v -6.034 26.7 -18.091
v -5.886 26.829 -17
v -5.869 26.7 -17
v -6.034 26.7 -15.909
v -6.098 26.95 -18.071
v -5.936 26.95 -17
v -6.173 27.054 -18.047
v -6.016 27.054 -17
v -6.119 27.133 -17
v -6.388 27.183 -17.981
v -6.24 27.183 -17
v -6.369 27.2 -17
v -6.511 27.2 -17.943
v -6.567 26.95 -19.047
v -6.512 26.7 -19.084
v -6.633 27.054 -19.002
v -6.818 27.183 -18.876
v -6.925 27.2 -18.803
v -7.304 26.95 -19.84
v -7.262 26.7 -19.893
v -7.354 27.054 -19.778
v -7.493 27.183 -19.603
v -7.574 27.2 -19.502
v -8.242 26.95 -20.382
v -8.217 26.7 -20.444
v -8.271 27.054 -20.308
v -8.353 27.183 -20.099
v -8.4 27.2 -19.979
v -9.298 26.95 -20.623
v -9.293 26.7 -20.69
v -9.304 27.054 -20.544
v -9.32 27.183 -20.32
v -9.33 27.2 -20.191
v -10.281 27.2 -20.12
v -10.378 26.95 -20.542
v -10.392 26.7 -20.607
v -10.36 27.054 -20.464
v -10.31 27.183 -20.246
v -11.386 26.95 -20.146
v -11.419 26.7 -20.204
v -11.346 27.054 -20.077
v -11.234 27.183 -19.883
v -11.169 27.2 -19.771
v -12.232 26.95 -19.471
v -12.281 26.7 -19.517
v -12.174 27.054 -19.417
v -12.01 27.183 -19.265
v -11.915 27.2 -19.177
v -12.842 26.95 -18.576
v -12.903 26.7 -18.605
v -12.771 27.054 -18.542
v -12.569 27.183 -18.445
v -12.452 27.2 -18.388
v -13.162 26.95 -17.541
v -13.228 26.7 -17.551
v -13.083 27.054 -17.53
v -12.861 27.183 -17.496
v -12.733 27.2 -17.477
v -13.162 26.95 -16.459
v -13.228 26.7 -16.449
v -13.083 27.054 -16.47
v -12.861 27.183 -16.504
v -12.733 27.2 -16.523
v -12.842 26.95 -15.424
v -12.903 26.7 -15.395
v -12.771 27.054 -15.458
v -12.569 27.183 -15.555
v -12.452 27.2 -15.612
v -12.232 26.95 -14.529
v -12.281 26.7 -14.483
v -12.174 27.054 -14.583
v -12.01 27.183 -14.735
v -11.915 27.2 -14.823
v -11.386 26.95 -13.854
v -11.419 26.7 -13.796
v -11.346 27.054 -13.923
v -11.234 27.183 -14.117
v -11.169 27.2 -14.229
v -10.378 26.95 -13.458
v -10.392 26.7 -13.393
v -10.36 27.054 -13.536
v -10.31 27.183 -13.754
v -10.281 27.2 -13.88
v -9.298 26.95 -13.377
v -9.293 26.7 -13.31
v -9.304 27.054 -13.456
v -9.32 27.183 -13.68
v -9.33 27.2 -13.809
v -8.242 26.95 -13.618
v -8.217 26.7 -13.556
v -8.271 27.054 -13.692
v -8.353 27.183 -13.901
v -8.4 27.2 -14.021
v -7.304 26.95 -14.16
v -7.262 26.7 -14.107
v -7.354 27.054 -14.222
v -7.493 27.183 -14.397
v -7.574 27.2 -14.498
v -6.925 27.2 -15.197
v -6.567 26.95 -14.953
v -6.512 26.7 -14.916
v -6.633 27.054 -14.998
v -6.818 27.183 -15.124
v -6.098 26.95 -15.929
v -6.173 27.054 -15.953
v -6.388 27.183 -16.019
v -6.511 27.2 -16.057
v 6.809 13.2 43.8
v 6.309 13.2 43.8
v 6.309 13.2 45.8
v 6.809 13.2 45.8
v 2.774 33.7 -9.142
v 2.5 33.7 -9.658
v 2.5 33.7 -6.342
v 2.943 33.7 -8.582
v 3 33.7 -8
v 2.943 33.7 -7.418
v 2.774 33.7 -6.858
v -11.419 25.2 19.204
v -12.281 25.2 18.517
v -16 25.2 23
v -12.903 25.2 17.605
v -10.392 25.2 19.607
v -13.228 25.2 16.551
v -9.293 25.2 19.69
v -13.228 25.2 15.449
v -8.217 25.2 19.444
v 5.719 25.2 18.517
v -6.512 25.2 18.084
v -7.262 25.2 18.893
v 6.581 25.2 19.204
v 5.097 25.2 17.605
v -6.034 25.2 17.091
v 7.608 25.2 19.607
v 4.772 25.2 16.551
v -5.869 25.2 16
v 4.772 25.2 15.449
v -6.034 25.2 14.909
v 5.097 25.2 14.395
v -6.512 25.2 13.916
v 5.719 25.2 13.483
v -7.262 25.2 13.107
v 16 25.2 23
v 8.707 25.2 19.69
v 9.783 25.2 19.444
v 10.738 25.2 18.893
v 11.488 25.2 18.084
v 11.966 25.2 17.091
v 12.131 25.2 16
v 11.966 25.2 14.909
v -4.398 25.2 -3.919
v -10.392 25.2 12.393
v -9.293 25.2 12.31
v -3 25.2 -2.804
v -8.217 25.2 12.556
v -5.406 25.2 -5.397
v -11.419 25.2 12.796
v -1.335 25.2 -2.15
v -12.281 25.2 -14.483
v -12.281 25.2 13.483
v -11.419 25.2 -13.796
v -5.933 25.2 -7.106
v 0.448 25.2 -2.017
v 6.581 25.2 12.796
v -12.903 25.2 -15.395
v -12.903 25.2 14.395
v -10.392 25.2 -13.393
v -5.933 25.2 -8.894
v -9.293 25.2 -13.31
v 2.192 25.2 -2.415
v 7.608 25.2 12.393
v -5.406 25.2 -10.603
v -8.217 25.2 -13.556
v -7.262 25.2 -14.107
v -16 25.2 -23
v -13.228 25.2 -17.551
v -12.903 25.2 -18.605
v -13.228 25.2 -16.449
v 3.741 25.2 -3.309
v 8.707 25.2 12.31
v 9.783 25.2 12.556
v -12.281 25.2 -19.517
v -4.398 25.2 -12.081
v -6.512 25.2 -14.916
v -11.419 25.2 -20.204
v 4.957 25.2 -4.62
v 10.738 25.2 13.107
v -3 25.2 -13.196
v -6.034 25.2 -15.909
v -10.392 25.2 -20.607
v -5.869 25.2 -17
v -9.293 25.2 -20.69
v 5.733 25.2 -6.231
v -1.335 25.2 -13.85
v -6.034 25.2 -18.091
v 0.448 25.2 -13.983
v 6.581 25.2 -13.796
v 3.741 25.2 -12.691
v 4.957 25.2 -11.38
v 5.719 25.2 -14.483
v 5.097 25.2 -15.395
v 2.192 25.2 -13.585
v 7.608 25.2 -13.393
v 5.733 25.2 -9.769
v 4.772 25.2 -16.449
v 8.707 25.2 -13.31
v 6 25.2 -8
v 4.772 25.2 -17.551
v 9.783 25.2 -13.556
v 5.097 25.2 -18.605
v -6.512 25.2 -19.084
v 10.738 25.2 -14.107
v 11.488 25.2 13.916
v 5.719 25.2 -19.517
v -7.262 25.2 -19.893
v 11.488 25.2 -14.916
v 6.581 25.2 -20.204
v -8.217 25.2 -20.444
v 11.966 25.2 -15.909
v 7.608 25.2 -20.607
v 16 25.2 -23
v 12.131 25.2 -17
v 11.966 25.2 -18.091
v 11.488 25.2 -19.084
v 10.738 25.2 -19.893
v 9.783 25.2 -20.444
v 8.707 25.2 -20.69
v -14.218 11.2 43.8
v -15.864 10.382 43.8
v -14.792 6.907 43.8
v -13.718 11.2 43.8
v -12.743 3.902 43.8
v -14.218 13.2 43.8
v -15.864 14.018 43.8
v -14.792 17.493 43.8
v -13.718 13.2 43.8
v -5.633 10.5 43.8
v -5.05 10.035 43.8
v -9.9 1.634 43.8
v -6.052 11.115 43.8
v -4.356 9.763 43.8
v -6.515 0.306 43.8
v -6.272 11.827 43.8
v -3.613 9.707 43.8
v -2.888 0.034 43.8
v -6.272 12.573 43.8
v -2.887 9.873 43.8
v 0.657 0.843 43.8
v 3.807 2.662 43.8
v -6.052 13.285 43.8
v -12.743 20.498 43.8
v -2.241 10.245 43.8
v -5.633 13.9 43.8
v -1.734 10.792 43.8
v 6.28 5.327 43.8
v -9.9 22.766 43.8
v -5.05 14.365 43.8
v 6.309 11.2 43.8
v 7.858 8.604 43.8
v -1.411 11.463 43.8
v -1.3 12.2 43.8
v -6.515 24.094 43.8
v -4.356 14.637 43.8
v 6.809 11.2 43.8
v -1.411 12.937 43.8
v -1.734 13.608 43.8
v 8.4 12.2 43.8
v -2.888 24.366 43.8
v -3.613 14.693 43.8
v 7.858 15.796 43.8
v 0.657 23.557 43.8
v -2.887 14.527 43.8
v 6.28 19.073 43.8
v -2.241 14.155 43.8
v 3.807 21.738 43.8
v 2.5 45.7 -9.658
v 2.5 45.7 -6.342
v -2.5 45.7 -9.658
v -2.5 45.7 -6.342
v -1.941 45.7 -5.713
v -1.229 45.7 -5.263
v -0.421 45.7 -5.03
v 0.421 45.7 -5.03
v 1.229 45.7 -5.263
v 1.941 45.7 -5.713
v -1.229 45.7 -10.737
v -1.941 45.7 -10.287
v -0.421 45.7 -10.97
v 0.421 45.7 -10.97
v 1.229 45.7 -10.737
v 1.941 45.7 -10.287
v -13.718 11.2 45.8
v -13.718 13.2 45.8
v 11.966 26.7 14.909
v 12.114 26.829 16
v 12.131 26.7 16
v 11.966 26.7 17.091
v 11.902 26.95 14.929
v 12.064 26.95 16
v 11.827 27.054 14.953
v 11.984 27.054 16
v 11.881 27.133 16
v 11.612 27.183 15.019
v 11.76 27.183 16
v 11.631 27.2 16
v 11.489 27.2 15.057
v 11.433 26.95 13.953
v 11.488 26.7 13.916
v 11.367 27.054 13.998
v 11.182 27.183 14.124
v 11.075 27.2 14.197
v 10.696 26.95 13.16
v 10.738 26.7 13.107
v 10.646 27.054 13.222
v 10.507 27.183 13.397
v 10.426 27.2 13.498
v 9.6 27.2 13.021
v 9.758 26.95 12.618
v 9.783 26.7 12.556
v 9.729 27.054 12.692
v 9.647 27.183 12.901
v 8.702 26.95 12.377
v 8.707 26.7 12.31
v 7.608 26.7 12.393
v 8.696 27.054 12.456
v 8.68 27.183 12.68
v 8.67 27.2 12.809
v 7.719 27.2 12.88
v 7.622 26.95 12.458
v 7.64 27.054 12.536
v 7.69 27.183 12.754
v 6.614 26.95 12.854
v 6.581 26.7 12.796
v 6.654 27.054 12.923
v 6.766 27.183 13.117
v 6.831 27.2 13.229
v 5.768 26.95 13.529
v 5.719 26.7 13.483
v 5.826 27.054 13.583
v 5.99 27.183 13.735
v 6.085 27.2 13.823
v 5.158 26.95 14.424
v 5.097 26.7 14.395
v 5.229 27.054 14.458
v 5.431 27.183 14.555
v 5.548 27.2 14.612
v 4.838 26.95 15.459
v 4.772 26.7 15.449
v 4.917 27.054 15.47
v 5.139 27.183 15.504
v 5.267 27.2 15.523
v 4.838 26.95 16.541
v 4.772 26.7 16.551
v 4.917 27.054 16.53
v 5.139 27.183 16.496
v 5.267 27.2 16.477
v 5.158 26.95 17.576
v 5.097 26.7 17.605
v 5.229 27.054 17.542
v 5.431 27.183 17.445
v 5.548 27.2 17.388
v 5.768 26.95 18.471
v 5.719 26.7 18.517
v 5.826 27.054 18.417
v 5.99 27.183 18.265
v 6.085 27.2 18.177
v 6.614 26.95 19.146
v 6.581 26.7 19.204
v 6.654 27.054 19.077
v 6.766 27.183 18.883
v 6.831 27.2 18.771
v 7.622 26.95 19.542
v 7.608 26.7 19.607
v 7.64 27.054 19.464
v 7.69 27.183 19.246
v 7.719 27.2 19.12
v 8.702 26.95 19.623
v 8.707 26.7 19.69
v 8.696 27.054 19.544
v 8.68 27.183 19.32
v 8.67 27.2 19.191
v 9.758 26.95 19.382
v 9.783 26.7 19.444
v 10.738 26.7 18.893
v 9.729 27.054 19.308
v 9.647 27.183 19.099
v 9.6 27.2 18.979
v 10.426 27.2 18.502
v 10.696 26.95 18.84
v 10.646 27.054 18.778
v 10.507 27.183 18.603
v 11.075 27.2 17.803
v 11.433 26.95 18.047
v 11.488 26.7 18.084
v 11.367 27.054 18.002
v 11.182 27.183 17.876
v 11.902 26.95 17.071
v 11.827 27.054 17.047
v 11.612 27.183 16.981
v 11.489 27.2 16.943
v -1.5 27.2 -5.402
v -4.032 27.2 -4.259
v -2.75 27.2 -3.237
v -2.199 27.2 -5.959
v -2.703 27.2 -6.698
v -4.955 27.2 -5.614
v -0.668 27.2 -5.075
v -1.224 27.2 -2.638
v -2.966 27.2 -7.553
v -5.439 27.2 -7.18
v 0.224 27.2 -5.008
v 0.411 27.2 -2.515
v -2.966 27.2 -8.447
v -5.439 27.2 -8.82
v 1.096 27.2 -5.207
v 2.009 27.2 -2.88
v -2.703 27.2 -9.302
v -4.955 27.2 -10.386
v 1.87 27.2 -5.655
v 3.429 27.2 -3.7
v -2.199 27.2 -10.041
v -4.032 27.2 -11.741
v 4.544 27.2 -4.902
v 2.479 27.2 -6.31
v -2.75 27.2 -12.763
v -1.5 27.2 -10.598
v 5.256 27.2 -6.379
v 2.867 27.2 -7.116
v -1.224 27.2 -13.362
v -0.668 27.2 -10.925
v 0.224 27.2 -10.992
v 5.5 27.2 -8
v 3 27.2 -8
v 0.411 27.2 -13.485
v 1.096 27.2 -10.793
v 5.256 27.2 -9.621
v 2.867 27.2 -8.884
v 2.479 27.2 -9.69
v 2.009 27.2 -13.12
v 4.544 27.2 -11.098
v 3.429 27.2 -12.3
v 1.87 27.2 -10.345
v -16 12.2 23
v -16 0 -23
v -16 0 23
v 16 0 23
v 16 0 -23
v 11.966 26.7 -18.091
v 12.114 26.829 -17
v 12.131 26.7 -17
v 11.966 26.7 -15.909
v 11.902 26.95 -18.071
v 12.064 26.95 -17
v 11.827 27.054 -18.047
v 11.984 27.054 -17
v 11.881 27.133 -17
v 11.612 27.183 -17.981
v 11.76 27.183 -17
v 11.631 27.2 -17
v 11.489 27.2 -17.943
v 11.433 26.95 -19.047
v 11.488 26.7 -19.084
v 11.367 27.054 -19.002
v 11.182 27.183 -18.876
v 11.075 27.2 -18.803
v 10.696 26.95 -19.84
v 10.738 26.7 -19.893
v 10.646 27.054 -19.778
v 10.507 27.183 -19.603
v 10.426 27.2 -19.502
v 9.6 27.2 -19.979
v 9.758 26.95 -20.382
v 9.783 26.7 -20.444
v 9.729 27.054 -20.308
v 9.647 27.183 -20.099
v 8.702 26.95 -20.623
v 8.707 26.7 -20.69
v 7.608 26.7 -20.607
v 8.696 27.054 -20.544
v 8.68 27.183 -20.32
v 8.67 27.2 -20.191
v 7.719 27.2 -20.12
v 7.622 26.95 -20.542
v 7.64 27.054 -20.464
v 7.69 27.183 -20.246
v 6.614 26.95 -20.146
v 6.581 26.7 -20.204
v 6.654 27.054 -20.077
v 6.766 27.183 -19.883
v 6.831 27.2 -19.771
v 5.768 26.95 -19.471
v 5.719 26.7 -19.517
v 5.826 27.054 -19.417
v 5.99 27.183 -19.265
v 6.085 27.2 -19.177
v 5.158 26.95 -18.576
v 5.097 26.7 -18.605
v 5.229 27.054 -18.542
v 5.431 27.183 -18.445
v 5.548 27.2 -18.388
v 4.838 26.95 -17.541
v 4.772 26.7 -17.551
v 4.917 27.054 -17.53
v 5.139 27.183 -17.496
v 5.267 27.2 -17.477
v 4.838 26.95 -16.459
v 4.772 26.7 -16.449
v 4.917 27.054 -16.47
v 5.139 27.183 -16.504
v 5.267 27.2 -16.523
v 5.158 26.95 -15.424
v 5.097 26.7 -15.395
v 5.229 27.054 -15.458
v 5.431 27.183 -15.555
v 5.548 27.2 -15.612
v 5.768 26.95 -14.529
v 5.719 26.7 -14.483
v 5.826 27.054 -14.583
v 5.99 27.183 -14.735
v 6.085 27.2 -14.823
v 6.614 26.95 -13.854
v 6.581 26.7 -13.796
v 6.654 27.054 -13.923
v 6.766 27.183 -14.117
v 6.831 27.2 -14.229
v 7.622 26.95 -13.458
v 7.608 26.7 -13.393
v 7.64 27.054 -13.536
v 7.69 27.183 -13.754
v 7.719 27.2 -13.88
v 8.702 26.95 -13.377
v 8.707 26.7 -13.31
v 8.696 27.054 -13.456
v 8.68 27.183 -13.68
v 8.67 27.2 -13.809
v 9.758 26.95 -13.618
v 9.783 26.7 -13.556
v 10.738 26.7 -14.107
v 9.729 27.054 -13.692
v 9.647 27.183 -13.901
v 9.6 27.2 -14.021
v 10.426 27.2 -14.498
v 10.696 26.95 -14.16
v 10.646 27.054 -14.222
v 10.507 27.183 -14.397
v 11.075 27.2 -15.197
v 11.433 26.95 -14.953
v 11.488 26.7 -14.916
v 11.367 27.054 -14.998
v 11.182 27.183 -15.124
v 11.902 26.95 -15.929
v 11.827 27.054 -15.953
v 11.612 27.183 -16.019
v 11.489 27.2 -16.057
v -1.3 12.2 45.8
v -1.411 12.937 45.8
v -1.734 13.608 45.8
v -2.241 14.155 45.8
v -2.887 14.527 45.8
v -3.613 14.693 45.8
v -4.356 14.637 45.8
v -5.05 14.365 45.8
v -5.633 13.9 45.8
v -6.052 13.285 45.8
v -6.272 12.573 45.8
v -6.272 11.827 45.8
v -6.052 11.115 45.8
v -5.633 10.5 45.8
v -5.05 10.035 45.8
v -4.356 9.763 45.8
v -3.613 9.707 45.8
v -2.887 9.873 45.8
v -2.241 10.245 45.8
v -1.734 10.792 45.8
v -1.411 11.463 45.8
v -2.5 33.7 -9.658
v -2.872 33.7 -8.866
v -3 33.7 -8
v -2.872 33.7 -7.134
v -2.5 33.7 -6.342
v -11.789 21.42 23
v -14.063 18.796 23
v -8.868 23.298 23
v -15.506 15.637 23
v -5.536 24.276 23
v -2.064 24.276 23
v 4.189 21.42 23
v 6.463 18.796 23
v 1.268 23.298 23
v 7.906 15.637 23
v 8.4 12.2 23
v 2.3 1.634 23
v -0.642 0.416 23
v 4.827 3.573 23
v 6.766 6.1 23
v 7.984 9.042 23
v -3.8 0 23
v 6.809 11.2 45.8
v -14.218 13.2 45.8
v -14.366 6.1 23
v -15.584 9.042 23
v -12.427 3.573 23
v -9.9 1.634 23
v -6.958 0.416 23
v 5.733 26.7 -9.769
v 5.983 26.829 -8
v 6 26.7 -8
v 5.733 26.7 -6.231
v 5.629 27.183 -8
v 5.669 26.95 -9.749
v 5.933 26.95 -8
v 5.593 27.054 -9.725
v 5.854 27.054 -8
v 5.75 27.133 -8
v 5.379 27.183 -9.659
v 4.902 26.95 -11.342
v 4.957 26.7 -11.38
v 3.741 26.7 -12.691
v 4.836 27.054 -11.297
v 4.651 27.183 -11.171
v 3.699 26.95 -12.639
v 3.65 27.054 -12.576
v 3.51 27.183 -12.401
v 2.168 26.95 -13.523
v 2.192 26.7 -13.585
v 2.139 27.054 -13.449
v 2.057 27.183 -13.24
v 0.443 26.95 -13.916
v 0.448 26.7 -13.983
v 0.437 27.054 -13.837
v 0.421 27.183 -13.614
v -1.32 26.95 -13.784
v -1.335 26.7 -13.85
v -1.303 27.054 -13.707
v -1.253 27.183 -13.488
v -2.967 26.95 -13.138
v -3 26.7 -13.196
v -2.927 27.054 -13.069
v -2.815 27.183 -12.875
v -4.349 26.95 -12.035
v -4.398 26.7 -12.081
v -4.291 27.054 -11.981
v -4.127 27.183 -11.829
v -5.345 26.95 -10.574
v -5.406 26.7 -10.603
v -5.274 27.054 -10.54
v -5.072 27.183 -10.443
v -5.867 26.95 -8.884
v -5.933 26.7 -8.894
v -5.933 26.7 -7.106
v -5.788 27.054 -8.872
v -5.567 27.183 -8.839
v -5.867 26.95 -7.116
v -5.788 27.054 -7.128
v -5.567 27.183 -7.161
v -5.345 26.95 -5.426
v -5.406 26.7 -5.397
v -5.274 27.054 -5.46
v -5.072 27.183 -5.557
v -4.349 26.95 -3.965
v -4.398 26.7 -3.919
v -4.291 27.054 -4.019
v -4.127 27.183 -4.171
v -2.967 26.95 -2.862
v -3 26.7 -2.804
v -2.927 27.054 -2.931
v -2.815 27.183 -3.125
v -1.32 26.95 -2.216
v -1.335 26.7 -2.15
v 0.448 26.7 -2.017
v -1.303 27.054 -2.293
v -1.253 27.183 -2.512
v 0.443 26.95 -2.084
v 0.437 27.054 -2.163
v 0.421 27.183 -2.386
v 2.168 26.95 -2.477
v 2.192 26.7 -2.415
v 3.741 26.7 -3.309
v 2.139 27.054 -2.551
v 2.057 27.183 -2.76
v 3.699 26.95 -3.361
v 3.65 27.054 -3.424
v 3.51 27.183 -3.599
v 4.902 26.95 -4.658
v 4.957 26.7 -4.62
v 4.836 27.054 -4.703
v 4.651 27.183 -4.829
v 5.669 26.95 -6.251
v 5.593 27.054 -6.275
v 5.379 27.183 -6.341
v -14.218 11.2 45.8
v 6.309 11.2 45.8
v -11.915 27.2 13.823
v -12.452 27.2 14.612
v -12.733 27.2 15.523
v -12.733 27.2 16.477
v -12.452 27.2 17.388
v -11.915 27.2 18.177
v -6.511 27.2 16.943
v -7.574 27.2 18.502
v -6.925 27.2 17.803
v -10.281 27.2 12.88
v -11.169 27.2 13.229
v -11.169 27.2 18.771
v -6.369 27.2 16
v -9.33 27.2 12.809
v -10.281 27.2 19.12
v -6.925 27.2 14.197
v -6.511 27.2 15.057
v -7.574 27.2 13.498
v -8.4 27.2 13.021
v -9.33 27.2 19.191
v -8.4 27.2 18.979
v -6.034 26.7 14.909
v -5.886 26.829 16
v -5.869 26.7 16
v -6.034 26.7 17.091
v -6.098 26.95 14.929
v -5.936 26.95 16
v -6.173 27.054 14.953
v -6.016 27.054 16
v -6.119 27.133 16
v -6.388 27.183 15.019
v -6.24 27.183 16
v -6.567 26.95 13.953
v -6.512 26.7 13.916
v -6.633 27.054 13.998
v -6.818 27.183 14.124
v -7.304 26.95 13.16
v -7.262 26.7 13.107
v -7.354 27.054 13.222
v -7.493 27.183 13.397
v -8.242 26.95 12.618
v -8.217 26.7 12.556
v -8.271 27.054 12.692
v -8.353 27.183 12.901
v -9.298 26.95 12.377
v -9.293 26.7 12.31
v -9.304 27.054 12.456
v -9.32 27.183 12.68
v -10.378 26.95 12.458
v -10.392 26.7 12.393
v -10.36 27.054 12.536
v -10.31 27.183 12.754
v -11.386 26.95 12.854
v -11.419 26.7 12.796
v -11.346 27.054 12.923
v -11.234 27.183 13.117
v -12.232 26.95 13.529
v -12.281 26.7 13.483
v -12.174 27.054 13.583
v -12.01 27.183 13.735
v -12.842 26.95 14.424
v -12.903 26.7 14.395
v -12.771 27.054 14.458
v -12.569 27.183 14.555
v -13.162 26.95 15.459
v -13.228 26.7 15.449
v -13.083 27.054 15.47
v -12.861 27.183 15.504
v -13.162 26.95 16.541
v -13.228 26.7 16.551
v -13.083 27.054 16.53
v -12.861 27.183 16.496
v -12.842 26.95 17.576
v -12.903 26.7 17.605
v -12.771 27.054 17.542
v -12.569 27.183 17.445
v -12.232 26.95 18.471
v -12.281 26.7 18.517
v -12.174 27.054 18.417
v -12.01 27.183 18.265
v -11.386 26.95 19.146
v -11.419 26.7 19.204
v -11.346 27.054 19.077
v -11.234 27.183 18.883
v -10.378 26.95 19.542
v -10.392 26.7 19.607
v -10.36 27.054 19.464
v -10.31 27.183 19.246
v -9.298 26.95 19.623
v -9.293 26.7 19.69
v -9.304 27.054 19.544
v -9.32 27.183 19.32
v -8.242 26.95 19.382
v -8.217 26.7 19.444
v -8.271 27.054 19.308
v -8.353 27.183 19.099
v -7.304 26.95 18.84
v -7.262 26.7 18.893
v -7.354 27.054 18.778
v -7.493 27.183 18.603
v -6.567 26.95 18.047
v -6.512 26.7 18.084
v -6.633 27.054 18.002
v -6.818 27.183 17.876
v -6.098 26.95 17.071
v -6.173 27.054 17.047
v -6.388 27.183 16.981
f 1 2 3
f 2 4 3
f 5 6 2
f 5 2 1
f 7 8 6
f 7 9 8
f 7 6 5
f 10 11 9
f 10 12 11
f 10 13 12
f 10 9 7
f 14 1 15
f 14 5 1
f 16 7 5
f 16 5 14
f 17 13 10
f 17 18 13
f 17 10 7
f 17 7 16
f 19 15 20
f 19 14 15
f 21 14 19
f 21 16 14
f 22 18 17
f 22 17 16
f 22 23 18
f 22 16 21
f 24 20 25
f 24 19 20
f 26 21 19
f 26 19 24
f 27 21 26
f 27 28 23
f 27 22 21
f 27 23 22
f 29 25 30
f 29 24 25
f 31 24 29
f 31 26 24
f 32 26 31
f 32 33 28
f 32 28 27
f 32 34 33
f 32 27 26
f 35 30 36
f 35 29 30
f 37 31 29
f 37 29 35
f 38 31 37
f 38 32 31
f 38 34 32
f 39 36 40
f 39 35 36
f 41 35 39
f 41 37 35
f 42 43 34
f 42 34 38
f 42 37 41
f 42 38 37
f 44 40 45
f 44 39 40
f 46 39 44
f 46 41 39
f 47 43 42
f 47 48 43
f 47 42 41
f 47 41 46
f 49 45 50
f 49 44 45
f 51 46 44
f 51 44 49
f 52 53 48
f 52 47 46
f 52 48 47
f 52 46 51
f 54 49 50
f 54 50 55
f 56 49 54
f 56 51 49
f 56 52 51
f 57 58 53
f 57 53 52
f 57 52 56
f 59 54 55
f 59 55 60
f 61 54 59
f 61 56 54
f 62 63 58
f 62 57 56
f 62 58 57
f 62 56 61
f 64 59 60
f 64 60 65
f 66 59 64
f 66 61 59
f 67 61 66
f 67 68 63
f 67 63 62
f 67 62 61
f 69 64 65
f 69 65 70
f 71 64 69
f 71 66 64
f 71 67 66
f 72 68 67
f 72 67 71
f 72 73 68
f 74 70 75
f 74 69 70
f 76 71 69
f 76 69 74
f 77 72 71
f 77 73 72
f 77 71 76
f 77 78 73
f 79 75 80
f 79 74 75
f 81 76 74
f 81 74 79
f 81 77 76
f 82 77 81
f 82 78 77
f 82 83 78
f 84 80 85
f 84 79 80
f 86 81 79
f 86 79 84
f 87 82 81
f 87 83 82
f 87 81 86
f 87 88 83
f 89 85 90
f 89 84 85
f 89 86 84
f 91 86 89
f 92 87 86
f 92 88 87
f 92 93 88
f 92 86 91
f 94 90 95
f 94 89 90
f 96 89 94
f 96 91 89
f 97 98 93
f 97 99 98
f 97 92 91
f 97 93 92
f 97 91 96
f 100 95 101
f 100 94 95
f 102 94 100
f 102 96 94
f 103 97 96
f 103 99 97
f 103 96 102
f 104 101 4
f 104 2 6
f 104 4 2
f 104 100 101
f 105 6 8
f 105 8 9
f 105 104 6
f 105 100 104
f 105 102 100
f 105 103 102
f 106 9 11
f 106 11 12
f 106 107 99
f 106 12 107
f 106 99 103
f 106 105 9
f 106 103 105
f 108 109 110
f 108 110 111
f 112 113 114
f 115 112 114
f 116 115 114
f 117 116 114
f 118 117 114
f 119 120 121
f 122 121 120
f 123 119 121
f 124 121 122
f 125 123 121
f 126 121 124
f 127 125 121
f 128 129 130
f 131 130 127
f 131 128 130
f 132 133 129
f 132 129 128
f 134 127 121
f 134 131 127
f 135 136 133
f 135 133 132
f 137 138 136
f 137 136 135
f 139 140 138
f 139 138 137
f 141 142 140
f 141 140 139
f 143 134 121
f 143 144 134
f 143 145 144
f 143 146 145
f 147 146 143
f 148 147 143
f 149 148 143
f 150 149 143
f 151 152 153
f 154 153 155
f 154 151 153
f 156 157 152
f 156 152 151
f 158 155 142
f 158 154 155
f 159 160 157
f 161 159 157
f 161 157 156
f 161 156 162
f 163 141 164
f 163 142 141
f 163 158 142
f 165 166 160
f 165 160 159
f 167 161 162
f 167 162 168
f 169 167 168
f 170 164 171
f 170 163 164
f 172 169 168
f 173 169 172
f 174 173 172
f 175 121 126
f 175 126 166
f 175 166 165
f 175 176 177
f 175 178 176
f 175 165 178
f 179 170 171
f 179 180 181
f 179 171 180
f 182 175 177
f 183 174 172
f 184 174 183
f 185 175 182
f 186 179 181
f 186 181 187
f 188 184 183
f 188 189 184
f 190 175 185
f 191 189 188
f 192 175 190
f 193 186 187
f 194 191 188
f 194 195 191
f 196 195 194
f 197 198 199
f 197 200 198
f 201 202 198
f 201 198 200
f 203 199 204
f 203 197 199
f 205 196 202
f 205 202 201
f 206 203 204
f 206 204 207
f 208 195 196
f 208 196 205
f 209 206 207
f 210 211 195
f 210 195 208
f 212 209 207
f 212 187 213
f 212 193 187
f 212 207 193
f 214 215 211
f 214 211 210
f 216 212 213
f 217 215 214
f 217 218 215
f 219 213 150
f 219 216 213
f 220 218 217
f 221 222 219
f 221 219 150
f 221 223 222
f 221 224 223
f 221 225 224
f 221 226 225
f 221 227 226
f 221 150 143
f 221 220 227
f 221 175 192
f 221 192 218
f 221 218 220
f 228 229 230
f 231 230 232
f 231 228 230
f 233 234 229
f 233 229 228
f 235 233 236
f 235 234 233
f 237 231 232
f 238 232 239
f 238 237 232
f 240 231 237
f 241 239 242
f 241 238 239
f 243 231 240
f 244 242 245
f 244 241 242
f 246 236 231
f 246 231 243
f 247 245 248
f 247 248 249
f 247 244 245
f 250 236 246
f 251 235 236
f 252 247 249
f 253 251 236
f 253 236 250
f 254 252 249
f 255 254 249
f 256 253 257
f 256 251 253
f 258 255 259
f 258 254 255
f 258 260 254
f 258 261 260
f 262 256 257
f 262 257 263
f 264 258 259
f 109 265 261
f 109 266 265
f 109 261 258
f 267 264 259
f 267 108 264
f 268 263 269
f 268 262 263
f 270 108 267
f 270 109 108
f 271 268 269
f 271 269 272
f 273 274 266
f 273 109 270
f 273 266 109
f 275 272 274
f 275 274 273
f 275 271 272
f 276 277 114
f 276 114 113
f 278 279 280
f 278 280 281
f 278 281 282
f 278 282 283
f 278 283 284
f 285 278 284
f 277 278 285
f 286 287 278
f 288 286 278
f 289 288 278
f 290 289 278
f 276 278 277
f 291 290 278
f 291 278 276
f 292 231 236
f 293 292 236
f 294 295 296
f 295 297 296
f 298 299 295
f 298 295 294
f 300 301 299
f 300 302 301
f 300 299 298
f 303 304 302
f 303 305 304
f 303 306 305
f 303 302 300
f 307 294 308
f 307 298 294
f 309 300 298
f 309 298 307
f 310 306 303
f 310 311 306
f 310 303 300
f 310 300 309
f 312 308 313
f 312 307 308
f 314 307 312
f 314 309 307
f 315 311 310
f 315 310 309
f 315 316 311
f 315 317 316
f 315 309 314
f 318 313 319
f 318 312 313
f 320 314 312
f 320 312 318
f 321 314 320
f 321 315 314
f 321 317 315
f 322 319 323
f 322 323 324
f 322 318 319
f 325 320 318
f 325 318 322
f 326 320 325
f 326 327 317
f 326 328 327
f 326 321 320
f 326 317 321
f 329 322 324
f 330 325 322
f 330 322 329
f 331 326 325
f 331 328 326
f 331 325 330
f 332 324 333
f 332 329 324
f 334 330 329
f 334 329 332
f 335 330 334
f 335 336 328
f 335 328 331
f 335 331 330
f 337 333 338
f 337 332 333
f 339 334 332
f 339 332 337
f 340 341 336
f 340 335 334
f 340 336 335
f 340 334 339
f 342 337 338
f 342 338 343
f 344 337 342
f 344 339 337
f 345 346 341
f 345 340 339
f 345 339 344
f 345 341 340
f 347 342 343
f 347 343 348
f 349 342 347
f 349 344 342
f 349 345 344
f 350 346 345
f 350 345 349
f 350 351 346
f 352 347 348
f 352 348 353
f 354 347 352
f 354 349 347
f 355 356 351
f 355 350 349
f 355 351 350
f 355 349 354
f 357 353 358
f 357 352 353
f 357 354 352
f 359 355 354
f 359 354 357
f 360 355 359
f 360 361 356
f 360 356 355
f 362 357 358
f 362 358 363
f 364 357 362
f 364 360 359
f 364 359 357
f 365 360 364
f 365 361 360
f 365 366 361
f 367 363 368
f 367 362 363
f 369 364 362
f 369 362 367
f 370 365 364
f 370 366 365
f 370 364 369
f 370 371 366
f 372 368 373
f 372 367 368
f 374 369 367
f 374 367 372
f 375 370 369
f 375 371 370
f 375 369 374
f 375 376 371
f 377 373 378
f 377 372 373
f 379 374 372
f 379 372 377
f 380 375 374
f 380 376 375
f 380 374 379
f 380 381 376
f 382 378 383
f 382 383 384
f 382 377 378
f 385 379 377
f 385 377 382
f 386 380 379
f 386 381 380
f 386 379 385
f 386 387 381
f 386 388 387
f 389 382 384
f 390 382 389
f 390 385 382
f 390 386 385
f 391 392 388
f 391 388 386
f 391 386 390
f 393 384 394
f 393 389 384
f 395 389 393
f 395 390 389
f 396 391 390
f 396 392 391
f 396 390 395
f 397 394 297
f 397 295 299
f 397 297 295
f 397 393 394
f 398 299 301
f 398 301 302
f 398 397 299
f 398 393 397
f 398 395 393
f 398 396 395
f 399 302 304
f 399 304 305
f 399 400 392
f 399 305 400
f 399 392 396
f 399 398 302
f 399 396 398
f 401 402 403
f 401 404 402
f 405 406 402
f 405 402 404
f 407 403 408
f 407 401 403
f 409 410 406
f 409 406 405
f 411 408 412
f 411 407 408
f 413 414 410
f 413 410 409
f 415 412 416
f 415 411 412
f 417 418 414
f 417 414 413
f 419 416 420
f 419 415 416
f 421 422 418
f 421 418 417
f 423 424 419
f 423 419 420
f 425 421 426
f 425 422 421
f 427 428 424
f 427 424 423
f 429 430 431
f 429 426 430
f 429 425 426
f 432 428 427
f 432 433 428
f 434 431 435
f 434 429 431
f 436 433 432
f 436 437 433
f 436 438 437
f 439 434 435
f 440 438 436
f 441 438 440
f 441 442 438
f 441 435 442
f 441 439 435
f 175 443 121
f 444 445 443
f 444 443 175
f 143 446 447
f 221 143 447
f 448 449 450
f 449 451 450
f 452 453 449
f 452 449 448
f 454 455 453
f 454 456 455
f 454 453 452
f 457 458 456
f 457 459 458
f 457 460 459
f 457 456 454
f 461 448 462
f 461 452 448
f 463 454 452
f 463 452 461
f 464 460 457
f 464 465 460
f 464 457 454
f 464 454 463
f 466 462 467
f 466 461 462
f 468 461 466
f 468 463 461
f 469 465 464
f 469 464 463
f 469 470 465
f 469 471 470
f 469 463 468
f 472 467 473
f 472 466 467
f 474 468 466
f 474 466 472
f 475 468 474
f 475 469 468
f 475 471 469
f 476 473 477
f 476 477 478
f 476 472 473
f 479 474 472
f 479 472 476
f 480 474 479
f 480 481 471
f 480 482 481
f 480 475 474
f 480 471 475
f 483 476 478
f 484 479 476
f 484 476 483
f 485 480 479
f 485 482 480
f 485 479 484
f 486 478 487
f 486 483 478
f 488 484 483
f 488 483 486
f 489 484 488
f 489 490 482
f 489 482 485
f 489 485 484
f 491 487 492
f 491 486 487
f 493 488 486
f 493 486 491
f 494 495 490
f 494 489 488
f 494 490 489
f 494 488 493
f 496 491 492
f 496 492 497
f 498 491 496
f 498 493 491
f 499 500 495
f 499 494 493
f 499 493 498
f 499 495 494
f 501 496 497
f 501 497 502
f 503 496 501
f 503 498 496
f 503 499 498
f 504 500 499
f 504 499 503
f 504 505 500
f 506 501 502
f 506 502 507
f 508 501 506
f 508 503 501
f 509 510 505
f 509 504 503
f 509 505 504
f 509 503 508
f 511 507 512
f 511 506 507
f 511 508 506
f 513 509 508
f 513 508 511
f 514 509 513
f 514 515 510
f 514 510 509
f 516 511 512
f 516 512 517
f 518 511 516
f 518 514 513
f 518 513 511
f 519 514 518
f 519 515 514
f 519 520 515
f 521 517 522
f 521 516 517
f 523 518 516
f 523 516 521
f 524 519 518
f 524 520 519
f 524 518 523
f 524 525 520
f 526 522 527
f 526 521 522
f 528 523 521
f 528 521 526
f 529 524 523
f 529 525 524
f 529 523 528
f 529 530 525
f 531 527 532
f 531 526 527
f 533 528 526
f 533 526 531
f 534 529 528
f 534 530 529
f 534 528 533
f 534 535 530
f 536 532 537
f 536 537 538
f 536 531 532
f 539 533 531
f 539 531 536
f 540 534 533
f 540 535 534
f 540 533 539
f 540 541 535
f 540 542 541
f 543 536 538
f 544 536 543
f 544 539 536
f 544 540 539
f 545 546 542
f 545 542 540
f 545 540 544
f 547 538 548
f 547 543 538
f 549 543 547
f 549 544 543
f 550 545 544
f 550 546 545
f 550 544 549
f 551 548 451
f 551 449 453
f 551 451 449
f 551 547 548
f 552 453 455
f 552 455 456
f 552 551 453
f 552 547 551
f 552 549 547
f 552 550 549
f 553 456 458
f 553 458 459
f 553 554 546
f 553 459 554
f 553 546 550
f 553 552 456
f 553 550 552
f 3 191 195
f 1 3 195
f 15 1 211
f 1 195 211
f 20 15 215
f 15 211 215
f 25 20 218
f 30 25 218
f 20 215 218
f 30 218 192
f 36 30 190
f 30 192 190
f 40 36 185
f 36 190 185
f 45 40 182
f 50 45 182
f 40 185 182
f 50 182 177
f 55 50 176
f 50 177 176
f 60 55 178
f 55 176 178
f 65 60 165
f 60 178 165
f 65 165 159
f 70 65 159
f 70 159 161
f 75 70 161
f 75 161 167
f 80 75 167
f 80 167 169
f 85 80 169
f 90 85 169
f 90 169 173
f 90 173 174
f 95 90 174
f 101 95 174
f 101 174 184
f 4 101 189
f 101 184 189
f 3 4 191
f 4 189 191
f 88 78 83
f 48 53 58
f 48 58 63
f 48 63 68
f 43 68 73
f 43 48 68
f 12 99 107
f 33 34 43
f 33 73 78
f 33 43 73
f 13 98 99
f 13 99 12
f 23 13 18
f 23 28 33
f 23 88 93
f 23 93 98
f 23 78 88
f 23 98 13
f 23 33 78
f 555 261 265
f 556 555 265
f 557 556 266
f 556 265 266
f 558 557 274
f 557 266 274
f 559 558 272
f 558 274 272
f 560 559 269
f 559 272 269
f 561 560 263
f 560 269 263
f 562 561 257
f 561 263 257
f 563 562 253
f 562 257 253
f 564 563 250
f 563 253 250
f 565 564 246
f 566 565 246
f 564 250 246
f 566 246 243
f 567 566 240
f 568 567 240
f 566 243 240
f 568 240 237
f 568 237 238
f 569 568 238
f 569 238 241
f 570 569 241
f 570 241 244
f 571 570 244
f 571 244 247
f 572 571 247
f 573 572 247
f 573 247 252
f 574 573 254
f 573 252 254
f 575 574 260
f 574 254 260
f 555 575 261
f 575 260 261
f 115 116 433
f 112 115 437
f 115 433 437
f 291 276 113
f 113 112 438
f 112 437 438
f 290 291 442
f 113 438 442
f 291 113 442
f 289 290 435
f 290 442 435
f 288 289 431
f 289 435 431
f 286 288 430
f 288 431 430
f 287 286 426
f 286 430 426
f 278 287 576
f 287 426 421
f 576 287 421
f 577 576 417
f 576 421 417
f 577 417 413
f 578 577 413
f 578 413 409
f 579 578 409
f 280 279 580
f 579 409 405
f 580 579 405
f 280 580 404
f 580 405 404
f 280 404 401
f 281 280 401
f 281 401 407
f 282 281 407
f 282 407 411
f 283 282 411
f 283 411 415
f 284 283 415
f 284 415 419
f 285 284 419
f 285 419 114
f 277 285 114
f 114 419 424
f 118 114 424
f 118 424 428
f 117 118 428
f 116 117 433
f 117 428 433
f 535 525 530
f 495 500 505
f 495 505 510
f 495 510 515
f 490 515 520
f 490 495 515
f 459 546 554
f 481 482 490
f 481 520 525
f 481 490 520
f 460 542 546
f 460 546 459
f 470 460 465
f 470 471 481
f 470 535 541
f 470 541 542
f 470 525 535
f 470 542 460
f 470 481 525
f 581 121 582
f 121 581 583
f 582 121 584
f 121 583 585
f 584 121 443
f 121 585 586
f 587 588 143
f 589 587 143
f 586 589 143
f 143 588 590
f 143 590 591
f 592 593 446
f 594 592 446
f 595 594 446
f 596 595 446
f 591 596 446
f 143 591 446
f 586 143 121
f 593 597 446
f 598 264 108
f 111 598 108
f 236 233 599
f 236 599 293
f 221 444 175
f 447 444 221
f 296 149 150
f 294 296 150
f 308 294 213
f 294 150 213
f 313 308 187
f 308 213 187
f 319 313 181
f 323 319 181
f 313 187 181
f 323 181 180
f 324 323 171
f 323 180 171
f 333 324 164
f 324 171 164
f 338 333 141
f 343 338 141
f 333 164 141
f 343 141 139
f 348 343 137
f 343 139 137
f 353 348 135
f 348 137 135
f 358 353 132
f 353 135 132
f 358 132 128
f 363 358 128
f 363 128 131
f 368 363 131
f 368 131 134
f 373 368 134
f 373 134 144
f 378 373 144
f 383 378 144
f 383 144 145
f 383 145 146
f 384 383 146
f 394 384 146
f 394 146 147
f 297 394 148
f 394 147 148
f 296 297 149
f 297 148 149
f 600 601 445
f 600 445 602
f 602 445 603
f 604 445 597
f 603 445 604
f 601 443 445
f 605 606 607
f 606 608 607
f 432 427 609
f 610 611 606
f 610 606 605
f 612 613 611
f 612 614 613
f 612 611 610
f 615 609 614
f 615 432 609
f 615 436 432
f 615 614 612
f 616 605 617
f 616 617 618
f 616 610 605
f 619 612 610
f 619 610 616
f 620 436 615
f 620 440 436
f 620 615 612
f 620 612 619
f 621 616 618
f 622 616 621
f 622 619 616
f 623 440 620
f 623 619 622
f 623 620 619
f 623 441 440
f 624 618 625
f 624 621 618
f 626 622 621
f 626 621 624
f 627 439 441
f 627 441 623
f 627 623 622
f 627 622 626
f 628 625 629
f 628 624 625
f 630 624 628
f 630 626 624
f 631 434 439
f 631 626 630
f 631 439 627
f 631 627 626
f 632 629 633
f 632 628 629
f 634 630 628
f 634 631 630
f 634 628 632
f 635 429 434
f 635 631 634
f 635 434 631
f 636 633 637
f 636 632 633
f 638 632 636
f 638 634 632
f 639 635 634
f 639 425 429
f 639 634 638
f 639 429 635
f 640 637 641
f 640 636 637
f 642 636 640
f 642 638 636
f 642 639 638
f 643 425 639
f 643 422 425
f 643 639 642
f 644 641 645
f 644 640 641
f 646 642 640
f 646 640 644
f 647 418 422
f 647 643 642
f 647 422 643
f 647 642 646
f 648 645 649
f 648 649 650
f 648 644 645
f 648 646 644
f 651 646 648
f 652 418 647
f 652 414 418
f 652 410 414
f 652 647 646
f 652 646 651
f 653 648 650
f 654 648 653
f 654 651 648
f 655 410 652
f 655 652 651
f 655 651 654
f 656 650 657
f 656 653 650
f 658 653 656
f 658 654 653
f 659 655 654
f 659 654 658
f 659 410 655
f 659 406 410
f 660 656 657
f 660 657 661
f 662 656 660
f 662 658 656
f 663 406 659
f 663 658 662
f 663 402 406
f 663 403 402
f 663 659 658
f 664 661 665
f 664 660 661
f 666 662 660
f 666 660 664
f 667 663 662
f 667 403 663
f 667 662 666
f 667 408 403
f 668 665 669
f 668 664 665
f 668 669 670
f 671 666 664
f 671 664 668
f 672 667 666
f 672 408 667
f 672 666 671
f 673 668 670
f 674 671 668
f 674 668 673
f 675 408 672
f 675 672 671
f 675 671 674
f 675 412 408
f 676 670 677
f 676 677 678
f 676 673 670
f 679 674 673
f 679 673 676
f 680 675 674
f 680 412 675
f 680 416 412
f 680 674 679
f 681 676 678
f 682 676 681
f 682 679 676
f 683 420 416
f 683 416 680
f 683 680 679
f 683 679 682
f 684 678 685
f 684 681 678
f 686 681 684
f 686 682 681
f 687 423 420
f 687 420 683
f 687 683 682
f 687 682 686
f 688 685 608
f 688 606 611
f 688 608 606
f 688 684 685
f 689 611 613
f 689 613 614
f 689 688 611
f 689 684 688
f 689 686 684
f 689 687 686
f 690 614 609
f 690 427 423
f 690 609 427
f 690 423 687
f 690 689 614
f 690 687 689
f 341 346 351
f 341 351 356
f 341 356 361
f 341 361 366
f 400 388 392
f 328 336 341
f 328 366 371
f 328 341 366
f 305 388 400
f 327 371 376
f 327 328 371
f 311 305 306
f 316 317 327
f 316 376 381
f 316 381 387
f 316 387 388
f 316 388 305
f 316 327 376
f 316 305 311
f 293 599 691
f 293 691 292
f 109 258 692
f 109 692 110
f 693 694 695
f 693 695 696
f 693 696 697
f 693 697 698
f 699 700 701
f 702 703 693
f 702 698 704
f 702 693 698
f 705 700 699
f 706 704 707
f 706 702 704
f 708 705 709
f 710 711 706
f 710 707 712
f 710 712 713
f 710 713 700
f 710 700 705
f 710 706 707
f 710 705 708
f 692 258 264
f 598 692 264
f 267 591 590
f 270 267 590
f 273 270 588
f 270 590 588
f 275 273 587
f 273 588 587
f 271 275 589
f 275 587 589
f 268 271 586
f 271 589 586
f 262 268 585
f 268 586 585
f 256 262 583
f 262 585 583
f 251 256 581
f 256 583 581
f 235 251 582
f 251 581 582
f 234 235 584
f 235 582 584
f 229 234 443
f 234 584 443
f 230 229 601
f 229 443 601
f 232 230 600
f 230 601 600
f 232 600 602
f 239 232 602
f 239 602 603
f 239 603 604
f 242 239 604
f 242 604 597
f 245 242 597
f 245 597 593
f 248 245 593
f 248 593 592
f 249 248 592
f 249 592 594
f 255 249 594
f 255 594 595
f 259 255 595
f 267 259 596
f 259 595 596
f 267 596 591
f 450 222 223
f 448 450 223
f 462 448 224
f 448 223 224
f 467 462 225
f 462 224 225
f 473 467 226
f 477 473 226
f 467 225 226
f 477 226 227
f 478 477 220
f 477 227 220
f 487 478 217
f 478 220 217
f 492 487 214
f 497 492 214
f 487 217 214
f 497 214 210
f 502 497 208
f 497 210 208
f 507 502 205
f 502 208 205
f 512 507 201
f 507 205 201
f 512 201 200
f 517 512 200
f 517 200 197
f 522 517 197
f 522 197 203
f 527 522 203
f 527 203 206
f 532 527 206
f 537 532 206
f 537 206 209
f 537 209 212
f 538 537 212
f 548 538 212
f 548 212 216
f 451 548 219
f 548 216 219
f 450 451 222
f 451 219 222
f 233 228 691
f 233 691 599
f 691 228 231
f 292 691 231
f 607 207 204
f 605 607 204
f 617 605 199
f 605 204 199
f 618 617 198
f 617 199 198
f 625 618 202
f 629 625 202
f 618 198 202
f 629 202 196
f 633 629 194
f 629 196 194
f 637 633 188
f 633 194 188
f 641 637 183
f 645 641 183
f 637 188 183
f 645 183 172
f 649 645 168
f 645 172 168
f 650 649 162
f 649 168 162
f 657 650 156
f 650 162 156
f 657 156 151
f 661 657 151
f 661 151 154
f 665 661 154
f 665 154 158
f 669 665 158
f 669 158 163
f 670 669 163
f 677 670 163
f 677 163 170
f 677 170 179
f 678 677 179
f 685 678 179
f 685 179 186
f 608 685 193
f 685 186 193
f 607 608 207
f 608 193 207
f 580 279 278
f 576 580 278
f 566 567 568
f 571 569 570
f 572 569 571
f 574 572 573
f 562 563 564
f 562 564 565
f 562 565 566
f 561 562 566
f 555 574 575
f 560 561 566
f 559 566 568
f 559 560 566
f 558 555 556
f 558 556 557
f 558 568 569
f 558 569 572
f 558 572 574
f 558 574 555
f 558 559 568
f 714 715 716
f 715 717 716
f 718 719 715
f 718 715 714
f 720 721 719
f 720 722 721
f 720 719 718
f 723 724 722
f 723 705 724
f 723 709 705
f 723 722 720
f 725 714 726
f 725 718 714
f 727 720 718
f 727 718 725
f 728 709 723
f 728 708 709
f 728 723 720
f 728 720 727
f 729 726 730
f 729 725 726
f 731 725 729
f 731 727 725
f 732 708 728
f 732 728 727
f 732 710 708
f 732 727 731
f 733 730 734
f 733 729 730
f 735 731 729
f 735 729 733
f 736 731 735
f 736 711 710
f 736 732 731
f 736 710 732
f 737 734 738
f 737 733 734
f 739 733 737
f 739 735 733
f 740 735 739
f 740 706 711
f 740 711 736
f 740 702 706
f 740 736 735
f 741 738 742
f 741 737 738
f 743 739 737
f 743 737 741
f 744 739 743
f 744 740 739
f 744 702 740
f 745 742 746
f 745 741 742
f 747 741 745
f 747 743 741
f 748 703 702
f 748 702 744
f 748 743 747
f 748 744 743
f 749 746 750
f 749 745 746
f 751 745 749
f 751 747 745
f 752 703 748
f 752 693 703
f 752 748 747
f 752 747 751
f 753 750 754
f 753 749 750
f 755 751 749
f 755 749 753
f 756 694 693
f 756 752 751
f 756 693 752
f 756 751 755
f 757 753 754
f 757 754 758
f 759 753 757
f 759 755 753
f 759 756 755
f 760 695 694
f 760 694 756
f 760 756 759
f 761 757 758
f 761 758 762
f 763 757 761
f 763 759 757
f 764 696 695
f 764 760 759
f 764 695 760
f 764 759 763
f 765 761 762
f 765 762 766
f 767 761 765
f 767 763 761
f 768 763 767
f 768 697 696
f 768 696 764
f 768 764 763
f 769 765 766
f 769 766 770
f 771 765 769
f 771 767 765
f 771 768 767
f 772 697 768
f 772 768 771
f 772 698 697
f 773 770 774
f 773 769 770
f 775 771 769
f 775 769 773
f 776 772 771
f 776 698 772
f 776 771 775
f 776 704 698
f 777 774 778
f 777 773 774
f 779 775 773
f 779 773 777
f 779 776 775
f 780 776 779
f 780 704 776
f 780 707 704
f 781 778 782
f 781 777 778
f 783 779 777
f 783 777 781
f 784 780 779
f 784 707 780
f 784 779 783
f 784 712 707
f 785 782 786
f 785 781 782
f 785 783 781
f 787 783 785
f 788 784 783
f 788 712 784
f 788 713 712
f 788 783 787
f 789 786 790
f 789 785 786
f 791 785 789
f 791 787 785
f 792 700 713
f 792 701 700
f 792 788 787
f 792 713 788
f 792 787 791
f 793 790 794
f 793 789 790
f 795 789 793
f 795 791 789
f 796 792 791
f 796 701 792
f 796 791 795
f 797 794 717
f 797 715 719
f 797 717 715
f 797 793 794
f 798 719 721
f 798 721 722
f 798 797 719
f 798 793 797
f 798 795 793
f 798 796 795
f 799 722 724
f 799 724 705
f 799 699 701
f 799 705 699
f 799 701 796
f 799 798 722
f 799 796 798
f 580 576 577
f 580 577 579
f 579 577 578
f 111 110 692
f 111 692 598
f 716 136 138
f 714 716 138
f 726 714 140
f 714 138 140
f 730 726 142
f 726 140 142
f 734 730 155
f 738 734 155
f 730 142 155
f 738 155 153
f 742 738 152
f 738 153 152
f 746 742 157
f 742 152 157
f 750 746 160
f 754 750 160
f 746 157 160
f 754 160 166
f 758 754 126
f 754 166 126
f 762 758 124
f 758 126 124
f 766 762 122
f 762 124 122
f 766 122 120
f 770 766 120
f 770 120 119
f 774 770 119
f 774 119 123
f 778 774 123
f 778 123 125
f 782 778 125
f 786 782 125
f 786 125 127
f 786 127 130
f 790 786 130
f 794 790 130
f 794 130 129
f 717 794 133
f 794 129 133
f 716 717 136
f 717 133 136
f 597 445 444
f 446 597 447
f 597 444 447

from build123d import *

# Parameters (mm, degrees)
CROQUIS1_W              = 32
CROQUIS1_H              = 46
CROQUIS1_R              = 6
CROQUIS1_R_2            = 3.7
SALIENTE_EXTRUIR1_DEPTH = 25.2
CROQUIS2_R              = 3.7
CROQUIS2_R_2            = 6
SALIENTE_EXTRUIR2_DEPTH = 2
CROQUIS3_R              = 12.2
SALIENTE_EXTRUIR3_DEPTH = 20.8
CROQUIS4_R              = 2.5
SALIENTE_EXTRUIR4_DEPTH = 2
CROQUIS5_W              = 0.5
CROQUIS5_H              = 2
SALIENTE_EXTRUIR5_DEPTH = 2
CROQUIS6_R              = 3
SALIENTE_EXTRUIR6_DEPTH = 18.5
CORTAR_EXTRUIR1_DEPTH   = 12
REDONDEO2_R             = 0.5


with BuildPart() as part:
    # Croquis1 → Saliente-Extruir1 (new body)
    with BuildSketch(Plane(origin=(0, 0, 0), x_dir=(1, 0, 0), z_dir=(0, 1, 0))):
        Rectangle(CROQUIS1_W, CROQUIS1_H)
        with Locations((0, 8)):
            Circle(CROQUIS1_R, mode=Mode.SUBTRACT)
        with Locations((8.430868167, -16)):
            Circle(CROQUIS1_R_2, mode=Mode.SUBTRACT)
        with Locations((-9.569131833, -16)):
            Circle(CROQUIS1_R_2, mode=Mode.SUBTRACT)
        with Locations((8.430868167, 17)):
            Circle(CROQUIS1_R_2, mode=Mode.SUBTRACT)
        with Locations((-9.569131833, 17)):
            Circle(CROQUIS1_R_2, mode=Mode.SUBTRACT)
        with Locations((0, 8)):
            Circle(CROQUIS1_R)
        with Locations((-9.569131833, 17)):
            Circle(CROQUIS1_R_2)
        with Locations((8.430868167, 17)):
            Circle(CROQUIS1_R_2)
        with Locations((-9.569131833, -16)):
            Circle(CROQUIS1_R_2)
        with Locations((8.430868167, -16)):
            Circle(CROQUIS1_R_2)
    extrude(amount=SALIENTE_EXTRUIR1_DEPTH)

    # Croquis2 → Saliente-Extruir2 (add)
    with BuildSketch(Plane(origin=(0, 25.2, 0), x_dir=(1, 0, 0), z_dir=(0, 1, 0))):
        with Locations((-9.569131833, 17)):
            Circle(CROQUIS2_R)
        with Locations((8.430868167, 17)):
            Circle(CROQUIS2_R)
        with Locations((8.430868167, -16)):
            Circle(CROQUIS2_R)
        with Locations((-9.569131833, -16)):
            Circle(CROQUIS2_R)
        with Locations((0, 8)):
            Circle(CROQUIS2_R_2)
    extrude(amount=SALIENTE_EXTRUIR2_DEPTH)

    # Croquis3 → Saliente-Extruir3 (add)
    with BuildSketch(Plane.XY.offset(23)):
        with Locations((-3.8, 12.2)):
            Circle(CROQUIS3_R)
    extrude(amount=SALIENTE_EXTRUIR3_DEPTH)

    # Croquis4 → Saliente-Extruir4 (add)
    with BuildSketch(Plane.XY.offset(43.8)):
        with Locations((-3.8, 12.2)):
            Circle(CROQUIS4_R)
    extrude(amount=SALIENTE_EXTRUIR4_DEPTH)

    # Croquis5 → Saliente-Extruir5 (add)
    with BuildSketch(Plane.XY.offset(43.8)):
        with Locations((6.559315441, 12.2)):
            Rectangle(CROQUIS5_W, CROQUIS5_H)
        with Locations((-13.968008184, 12.2)):
            Rectangle(CROQUIS5_W, CROQUIS5_H)
    extrude(amount=SALIENTE_EXTRUIR5_DEPTH)

    # Croquis6 → Saliente-Extruir6 (add)
    with BuildSketch(Plane(origin=(0, 27.2, 0), x_dir=(1, 0, 0), z_dir=(0, 1, 0))):
        with Locations((0, 8)):
            Circle(CROQUIS6_R)
    extrude(amount=SALIENTE_EXTRUIR6_DEPTH)

    # Croquis7 → Cortar-Extruir1 (cut)
    with BuildSketch(Plane(origin=(0, 45.7, 0), x_dir=(1, 0, 0), z_dir=(0, 1, 0))):
        with BuildLine():
            Line((-2.5, 6.341687605), (-2.5, 9.658312395))
            ThreePointArc((-2.5, 9.658312395), (-3, 8), (-2.5, 6.341687605))
        make_face()
        with BuildLine():
            Line((2.5, 6.341687605), (2.5, 9.658312395))
            ThreePointArc((2.5, 9.658312395), (3, 8), (2.5, 6.341687605))
        make_face()
    extrude(amount=-CORTAR_EXTRUIR1_DEPTH, mode=Mode.SUBTRACT)

    # Redondeo2
    redondeo2_edges = [part.edges().sort_by_distance(p)[0] for p in [
        (-13.269131833, 27.2, -17),
        (4.730868167, 27.2, -17),
        (4.730868167, 27.2, 16),
        (-13.269131833, 27.2, 16),
        (-6, 27.2, -8),
    ]]
    fillet(redondeo2_edges, radius=REDONDEO2_R)


solid = part.part
